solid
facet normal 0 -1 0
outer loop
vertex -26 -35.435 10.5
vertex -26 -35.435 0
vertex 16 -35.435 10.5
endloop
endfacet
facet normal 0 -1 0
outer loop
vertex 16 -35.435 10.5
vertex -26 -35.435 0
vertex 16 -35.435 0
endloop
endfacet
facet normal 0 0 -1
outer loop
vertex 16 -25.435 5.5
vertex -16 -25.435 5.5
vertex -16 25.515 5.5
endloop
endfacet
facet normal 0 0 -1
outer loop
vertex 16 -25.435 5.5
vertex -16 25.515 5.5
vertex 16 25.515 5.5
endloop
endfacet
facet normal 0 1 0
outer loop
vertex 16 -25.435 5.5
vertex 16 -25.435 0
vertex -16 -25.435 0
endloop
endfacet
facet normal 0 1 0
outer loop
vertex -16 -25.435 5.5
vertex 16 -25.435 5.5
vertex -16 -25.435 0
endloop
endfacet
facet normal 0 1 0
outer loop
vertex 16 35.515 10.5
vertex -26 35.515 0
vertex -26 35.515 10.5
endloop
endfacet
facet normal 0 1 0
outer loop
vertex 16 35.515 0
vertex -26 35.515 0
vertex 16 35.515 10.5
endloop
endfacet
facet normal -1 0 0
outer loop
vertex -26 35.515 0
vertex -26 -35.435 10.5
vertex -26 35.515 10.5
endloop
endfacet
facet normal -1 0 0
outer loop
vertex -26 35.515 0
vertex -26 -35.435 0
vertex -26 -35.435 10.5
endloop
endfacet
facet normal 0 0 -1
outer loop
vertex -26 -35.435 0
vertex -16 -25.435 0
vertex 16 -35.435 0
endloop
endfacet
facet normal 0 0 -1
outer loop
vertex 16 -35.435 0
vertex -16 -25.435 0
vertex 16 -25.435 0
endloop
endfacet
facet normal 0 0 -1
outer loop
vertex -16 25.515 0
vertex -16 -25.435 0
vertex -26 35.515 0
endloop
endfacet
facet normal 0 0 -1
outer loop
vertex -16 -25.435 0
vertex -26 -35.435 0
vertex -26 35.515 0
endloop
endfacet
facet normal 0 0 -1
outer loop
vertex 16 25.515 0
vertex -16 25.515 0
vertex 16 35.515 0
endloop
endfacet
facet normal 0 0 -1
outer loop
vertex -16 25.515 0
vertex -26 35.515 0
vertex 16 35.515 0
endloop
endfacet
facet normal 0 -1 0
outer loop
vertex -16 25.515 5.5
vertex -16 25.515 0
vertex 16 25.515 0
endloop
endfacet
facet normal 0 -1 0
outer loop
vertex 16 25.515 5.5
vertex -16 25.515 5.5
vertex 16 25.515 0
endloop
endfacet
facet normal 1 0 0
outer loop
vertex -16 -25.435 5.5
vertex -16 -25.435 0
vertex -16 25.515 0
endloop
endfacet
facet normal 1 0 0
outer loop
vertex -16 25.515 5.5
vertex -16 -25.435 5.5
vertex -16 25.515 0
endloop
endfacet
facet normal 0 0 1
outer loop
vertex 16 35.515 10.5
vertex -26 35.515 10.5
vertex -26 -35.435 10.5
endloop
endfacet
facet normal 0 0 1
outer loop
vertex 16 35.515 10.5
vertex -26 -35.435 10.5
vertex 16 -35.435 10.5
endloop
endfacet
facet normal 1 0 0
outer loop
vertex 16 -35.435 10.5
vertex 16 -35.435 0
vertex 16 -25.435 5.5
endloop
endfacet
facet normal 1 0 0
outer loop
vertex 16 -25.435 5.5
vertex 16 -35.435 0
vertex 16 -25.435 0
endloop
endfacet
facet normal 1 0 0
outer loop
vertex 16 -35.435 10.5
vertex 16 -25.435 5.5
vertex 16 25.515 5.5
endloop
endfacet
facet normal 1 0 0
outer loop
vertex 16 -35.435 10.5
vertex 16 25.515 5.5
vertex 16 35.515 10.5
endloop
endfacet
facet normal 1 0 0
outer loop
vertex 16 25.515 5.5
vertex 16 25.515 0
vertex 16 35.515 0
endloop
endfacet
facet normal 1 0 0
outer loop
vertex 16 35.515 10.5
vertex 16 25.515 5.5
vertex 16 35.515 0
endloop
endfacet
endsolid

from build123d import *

# Parameters (mm, degrees)
SALIENTE_EXTRUIR1_DEPTH = 5.5
CROQUIS2_W              = 42
CROQUIS2_H              = 70.95
SALIENTE_EXTRUIR2_DEPTH = 5


with BuildPart() as part:
    # Croquis1 → Saliente-Extruir1 (new body)
    with BuildSketch(Plane.XY):
        Polygon((-16, -25.435), (-16, 25.515), (16, 25.515), (16, 35.515), (-26, 35.515), (-26, -35.435), (16, -35.435), (16, -25.435), align=None)
    extrude(amount=SALIENTE_EXTRUIR1_DEPTH)

    # Croquis2 → Saliente-Extruir2 (add)
    with BuildSketch(Plane.XY.offset(5.5)):
        with Locations((-5, 0.04)):
            Rectangle(CROQUIS2_W, CROQUIS2_H)
    extrude(amount=SALIENTE_EXTRUIR2_DEPTH)


solid = part.part
